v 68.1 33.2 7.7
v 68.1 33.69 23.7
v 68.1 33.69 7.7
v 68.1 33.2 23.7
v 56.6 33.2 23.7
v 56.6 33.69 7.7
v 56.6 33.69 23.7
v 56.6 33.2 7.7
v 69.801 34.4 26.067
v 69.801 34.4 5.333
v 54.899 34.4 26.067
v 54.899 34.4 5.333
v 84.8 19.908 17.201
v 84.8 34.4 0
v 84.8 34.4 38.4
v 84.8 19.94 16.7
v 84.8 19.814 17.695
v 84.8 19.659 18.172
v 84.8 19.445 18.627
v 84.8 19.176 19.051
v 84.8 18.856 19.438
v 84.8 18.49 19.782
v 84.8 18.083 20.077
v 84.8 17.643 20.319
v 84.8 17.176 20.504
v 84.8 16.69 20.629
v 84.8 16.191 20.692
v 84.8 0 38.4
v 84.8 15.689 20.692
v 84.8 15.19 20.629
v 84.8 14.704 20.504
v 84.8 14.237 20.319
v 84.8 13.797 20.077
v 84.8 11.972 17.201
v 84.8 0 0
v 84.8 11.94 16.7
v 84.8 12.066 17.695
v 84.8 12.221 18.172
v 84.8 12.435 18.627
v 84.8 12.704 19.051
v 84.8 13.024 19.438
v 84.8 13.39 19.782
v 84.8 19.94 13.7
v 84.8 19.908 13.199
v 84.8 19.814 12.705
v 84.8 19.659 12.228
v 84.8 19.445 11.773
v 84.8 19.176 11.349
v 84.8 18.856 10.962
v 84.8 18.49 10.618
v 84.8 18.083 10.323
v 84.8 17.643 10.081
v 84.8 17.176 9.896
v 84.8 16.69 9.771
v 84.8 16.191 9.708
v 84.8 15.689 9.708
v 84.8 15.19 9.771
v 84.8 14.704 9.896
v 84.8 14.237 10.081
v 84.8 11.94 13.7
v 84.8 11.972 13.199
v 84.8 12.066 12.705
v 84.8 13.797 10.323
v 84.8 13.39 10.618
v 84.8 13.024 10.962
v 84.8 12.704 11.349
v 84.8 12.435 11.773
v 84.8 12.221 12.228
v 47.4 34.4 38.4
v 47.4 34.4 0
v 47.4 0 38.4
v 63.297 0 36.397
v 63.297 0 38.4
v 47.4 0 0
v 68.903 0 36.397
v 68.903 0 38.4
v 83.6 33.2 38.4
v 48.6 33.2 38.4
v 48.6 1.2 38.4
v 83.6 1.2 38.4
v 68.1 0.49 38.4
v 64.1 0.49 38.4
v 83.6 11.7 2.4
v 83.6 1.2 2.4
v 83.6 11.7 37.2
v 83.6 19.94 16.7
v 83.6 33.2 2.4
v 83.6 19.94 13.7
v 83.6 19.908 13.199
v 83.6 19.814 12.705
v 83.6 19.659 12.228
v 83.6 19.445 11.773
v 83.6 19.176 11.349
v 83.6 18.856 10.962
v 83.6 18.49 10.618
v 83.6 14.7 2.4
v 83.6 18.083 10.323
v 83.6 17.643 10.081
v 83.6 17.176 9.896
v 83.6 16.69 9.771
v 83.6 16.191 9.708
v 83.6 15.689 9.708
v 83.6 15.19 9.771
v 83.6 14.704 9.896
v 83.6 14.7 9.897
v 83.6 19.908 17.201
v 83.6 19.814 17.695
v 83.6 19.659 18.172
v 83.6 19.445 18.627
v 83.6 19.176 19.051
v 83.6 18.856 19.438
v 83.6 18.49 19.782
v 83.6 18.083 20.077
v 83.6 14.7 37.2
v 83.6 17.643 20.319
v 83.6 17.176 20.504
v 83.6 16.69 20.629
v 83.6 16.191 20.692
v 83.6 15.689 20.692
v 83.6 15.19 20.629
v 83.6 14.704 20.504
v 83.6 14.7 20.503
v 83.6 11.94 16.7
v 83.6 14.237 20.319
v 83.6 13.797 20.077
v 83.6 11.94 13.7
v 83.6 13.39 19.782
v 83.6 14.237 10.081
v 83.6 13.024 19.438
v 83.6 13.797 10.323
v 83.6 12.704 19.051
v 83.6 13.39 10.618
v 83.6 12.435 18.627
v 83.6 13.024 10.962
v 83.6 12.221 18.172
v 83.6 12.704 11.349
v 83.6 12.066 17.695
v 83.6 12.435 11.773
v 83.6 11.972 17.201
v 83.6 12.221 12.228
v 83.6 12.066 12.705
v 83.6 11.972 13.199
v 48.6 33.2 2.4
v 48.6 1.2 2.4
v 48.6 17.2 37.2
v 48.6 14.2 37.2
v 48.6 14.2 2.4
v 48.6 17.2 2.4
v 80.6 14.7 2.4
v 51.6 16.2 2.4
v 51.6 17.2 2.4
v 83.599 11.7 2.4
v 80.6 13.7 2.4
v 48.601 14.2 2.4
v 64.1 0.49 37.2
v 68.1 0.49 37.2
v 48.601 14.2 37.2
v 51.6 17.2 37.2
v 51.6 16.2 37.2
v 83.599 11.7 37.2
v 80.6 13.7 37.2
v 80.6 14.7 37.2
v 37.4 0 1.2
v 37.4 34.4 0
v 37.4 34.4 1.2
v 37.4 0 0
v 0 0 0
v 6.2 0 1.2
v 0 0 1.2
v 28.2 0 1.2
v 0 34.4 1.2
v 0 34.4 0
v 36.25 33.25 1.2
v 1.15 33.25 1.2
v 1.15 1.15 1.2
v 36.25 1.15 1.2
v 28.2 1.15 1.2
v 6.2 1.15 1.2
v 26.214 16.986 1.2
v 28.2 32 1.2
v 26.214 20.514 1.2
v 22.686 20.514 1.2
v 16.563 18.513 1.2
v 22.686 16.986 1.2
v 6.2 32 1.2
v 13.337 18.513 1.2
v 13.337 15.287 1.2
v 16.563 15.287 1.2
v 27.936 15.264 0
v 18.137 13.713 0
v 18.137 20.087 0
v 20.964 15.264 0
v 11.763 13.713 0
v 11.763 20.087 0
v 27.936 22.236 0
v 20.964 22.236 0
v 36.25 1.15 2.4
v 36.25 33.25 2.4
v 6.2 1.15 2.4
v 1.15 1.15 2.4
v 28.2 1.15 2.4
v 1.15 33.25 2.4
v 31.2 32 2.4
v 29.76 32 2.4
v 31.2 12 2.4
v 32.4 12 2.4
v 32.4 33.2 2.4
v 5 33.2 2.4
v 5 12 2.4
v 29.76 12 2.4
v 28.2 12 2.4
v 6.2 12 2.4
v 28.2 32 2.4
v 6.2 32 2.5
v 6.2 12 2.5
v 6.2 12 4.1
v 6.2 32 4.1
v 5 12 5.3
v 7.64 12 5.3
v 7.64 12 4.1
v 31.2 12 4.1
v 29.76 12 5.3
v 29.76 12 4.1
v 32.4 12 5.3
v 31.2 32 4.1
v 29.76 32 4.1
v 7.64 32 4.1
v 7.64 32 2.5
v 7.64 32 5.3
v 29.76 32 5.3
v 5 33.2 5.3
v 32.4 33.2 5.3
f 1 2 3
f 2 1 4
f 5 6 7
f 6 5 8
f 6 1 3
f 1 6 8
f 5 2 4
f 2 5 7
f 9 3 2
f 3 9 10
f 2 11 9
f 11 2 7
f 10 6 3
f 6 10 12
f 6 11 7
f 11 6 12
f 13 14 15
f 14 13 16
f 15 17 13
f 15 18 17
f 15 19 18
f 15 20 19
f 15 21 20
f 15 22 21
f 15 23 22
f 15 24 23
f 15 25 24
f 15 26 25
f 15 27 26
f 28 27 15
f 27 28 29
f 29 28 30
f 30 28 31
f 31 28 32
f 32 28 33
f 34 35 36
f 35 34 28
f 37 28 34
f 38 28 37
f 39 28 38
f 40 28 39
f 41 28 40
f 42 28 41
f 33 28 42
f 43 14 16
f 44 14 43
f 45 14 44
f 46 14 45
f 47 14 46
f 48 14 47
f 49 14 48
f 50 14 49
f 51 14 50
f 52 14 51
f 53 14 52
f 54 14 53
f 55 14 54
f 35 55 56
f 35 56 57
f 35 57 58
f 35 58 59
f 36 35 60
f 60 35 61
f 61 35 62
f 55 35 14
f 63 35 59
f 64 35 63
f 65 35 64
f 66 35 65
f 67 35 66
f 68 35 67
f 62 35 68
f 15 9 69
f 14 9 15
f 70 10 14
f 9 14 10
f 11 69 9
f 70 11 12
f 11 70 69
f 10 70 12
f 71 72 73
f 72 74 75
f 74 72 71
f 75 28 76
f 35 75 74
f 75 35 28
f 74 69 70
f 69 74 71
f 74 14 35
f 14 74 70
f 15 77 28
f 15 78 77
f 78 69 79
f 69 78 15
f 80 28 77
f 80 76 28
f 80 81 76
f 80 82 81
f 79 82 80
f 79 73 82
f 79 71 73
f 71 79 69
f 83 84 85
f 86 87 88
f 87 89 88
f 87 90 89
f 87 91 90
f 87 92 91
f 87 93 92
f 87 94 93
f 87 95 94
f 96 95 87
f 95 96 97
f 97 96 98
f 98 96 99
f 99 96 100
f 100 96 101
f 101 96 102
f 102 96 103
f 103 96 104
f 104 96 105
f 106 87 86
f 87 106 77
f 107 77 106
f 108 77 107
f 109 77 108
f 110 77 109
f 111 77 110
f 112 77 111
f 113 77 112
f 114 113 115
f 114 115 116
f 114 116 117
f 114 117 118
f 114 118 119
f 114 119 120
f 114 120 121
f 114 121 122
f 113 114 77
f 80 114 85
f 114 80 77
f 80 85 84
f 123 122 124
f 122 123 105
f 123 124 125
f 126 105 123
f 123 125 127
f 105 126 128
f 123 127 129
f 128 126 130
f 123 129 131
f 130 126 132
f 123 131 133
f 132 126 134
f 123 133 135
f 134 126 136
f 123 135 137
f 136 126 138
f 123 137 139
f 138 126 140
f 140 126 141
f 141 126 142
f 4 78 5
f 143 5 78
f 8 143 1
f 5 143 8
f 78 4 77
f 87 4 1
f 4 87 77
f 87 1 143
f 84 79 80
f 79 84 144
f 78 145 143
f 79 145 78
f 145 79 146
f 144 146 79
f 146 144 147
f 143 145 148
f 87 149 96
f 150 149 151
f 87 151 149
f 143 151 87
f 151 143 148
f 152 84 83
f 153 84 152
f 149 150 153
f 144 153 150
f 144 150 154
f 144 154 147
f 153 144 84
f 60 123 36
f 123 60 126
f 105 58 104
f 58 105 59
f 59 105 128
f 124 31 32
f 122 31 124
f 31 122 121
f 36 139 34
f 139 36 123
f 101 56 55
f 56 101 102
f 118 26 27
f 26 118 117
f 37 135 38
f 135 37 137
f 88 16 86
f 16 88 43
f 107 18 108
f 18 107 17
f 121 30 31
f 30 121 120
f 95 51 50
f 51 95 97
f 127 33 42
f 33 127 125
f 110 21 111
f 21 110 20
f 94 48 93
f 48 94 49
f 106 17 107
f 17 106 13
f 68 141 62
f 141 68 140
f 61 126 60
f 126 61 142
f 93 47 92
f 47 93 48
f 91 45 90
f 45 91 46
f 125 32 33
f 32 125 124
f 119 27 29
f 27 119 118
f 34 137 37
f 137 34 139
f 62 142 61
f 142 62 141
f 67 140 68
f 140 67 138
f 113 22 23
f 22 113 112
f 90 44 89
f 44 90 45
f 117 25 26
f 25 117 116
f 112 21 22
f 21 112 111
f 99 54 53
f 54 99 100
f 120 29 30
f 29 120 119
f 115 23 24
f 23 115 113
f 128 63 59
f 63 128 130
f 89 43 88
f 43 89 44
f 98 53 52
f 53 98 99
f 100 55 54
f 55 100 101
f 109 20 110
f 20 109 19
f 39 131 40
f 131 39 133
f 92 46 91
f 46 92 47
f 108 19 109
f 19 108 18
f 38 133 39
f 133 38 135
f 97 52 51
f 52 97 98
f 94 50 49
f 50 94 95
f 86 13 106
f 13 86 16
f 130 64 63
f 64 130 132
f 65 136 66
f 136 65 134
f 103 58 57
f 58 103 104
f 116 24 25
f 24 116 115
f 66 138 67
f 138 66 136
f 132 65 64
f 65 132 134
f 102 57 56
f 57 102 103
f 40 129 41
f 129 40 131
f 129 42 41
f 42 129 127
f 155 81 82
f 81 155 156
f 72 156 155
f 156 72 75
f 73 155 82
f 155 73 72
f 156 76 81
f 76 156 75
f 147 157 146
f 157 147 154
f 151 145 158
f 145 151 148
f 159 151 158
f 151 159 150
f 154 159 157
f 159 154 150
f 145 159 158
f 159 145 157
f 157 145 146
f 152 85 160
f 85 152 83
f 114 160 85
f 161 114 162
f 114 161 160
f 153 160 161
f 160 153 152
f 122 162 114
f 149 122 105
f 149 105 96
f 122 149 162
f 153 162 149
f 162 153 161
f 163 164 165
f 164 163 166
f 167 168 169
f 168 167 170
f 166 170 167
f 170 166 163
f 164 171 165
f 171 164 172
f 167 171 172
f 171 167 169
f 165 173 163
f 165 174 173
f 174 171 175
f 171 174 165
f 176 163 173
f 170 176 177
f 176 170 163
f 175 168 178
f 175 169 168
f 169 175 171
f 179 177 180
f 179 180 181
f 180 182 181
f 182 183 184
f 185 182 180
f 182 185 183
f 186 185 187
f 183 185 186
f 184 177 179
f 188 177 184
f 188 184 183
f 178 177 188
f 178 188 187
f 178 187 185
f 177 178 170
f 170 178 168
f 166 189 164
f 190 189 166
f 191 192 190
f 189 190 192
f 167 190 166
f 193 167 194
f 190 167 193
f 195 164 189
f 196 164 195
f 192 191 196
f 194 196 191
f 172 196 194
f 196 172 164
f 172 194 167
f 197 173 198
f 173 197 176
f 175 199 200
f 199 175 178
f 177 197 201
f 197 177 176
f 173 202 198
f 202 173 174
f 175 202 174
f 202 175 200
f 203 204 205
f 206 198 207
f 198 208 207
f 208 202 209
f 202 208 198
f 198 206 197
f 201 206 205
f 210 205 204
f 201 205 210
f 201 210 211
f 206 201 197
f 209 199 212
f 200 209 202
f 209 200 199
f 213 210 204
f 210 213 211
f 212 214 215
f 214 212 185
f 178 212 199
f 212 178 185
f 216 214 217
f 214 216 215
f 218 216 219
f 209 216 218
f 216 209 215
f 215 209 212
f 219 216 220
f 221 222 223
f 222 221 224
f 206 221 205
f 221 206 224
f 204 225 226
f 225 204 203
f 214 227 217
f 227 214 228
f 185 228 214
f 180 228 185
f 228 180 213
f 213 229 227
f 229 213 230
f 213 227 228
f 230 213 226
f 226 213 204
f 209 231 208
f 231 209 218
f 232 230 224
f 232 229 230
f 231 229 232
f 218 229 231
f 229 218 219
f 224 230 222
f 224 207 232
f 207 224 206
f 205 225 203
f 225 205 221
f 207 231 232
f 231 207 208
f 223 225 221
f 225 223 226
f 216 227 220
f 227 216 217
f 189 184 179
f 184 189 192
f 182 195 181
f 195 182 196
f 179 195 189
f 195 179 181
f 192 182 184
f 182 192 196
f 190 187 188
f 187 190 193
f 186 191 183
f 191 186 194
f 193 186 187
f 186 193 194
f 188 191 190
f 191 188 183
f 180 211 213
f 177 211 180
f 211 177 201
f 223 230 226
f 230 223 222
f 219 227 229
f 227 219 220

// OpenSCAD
// MODIFY BELOW VARIABLES TO CUSTOMIZE
/*

 WIDTH
  <->
 _____
/     \
▏     ▕       
▏     ▕  ^
▏     ▕  | Height
┕┒    ▕  ⌄ 
 ▕____▕ 

*/

WEMOS_WIDTH = 25;
WEMOS_HEIGHT = 35;
WEMOS_THICKNESS = 1;
WEMOS_WIFI_THICKNESS = 1;
WEMOS_USB_THICKNESS = 2.5;
WEMOS_USB_WIDTH = 8;
WEMOS_USB_CENTER_TO_RIGHT = 14;

USB_CABLE_HEIGHT = 8;
USB_CABLE_WIDTH = 11;

/*
 WIDTH
  <->
 _____
/     \       ^  WEMOS_OLED_OFFSET_TOP
_______       ⌄
▏_____ ▏ ^      
▏▏OLED▏▏ | Height
▏▏___▕▕  ⌄
┕┒_____▏  

*/

WEMOS_OLED_OFFSET_TOP = 7; /* offset to wifi antenna when mounted*/
OLED_WIDTH = 26;
OLED_HEIGHT = 28;
OLED_AND_PINS_THICKNESS = 15;
OLED_THICKNESS = 1.3;
DISPLAY_WIDTH = 16;
DISPLAY_HEIGHT = 11.5;
DISPLAY_OFFSET_LR = 6.5;
DISPLAY_OFFSET_TOP = 1; // offset display to end of it's platine


/*
 WIDTH
  <->
 _______  ^
 ▏○   ◠ ▏ | Height
▕_______▏ ⌄    
SCL -> D1
SDA -> D2

*/
CO2_WIDTH = 25;
CO2_HEIGHT = 20;
CO2_THICKNESS = 1.7;
CO2_OFFSET_LEFT_ENS160 = 7.15;
CO2_OFFSET_BOTTOM_ENS160 = 13.5;
CO2_ENS160_SIZE = 3.2;
CO2_COMP_HEIGHT = 1.2;
CO2_COMP_OFFSET_RIGHT = 3;

CO2_OFFSET_LEFT_AHT21= 16.5;
CO2_OFFSET_BOTTOM_AHT21 = 11.5;
CO2_AHT21_SIZE = 3.5;


/*
           X
          <->
        ________     ^
Y /    /       /|    | Z
 /    /_______/ |    ⌄ 
      |       | /
      |_______|/
*/
BOX_X = WEMOS_HEIGHT;
BOX_Y = 36;
BOX_Z = 32;
WALL_THICKNESS = 1.2;

BOX_X_OUTER = BOX_X + 2 * WALL_THICKNESS;
BOX_Y_OUTER = BOX_Y + 2 * WALL_THICKNESS;
BOX_Z_OUTER = BOX_Z + 2 * WALL_THICKNESS;

// Stützen um Wemos draufzulegen
BOX_BAR_HEIGHT = 3;
BOX_BAR_WIDTH = 3;

// SENS
SENSOR_SUPPORT_BAR_WIDTH = 2.4;

// INTERN PARAMS
WEMOS_UPPER_HEIGHT = OLED_AND_PINS_THICKNESS + WEMOS_THICKNESS;
WEMOS_DISPLAY_OFFSET_TOP = WEMOS_OLED_OFFSET_TOP + DISPLAY_OFFSET_TOP;
CAP_PADDING = BOX_BAR_WIDTH + 2;


/**
 _
| |
|/
Stütze um den WEMOS draufzulegen
*/
module wemos_bar_left() {
    // verbindet die äussere Hülle von Objekten
    translate([0,0,-BOX_BAR_HEIGHT])
        hull() {
            translate([0, 0, BOX_BAR_HEIGHT - 1])
                cube([BOX_BAR_WIDTH, BOX_Y, 1]);
            cube([0.001, BOX_Y, 0.001]); // trick: ein ganz dünner Balken als unteren Rand
        }
}

/**
 _
| |
 \|
Stütze um den WEMOS draufzulegen
*/
module wemos_bar_right() {
    // verbindet die äussere Hülle von Objekten
    translate([0,BOX_Y,0])
        rotate([0,0,180])
            wemos_bar_left();
}


module usb_hole() {
    r = USB_CABLE_HEIGHT / 2;
    translate([-0.01, 0, -(USB_CABLE_HEIGHT - WEMOS_USB_THICKNESS) / 2 - 0.01])
    rotate([0, 90, 0])
        translate([-r, -(USB_CABLE_WIDTH - USB_CABLE_HEIGHT) / 2, 0])
            hull() {
                cylinder(WALL_THICKNESS+0.02, r, r, $fn=50);
                translate([0, USB_CABLE_WIDTH - USB_CABLE_HEIGHT, 0])
                    cylinder(WALL_THICKNESS+0.02, r, r, $fn=50);
            }
}


module display_hole() {
    center_x = DISPLAY_HEIGHT / 2;
    center_y = DISPLAY_WIDTH / 2;
    translate([center_x,center_y, 0.5])
        scale([DISPLAY_HEIGHT, DISPLAY_WIDTH, 1])
            rotate([0,0,45])
                cylinder(h=WALL_THICKNESS,r1=1/sqrt(2), r2=1.5/sqrt(2),$fn=4);
}


module sensor_hole(size) {
    r = size / 2; 
    translate([r, 0, r])
        rotate([-90, 0, 0])
            rotate([0,0,45])
                cylinder(h=WALL_THICKNESS+0.02, r1=sqrt(2)*size, r2=size / sqrt(2), $fn=4);

}

module box() {
    union() {
        difference() {
            // OUTER BOX
            translate([-WALL_THICKNESS, -WALL_THICKNESS, -WALL_THICKNESS])
                cube([BOX_X_OUTER, BOX_Y_OUTER, BOX_Z_OUTER]);

            // INNER BOX
            translate([0, -WALL_THICKNESS-0.1, 0])
                cube([BOX_X,BOX_Y+0.1,BOX_Z]);

            // USB Hole
            usb_y = BOX_Y - WEMOS_USB_CENTER_TO_RIGHT;
            usb_z = BOX_Z - WEMOS_UPPER_HEIGHT - WEMOS_USB_THICKNESS;
            translate([BOX_X, usb_y, usb_z])
                usb_hole();

            // DISPLAY HOLE
            translate([WEMOS_DISPLAY_OFFSET_TOP, BOX_Y - DISPLAY_OFFSET_LR - DISPLAY_WIDTH, BOX_Z - 0.01])
                union() {
                    cube([DISPLAY_HEIGHT, DISPLAY_WIDTH, WALL_THICKNESS + 0.02]);
                    display_hole();
                }
            
            // CAP REMOVAL HOLE
            translate([BOX_X / 2, WALL_THICKNESS / 2 - 2.6, -WALL_THICKNESS*1.1])
                rotate([0, 0, 45])
                    cylinder(h=WALL_THICKNESS+0.02, r1=8 / sqrt(2), r2= 4 / sqrt(2), center=true, $fn=4);
            
        }
        // WIFI-SIDE
        translate([0, 0, BOX_Z - WEMOS_UPPER_HEIGHT])
            wemos_bar_left();

        // USB-SIDE
        translate([BOX_X, 0, BOX_Z - WEMOS_UPPER_HEIGHT - WEMOS_USB_THICKNESS])
            wemos_bar_right();
    }
}
module cap() {
    offset = 0.05;
    difference() {
        union() {
            // BASE
            translate([-WALL_THICKNESS, -WALL_THICKNESS, -WALL_THICKNESS])
                cube([BOX_X_OUTER, WALL_THICKNESS, BOX_Z_OUTER]);
            // INSET
            translate([-offset, 0, -offset])
                cube([BOX_X + 2 * offset, WALL_THICKNESS, BOX_Z + 2 * offset]);
            // HOLDER LEFT
            translate([CAP_PADDING - WALL_THICKNESS, WALL_THICKNESS, WALL_THICKNESS])
                cube([WALL_THICKNESS, CO2_THICKNESS + WALL_THICKNESS, CO2_HEIGHT]);
            
            // HOLDER RIGHT
            translate([CAP_PADDING + CO2_WIDTH, WALL_THICKNESS, WALL_THICKNESS])
                cube([WALL_THICKNESS, CO2_THICKNESS + WALL_THICKNESS, CO2_HEIGHT]);

            // HOLDER BOTTOM
            translate([CAP_PADDING-WALL_THICKNESS, WALL_THICKNESS, 0])
                cube([CO2_WIDTH+2*WALL_THICKNESS, CO2_THICKNESS + WALL_THICKNESS, WALL_THICKNESS]);
            
            // HOLDER TOP
            translate([CAP_PADDING-WALL_THICKNESS, CO2_THICKNESS + WALL_THICKNESS, 0])
                cube([CO2_WIDTH+2*WALL_THICKNESS, WALL_THICKNESS, CO2_HEIGHT + WALL_THICKNESS]);
        }
        // AHT21
        aht_x = CAP_PADDING + CO2_OFFSET_LEFT_AHT21;
        aht_y = -WALL_THICKNESS - 0.01;
        aht_z = WALL_THICKNESS + CO2_OFFSET_BOTTOM_AHT21;
        translate([aht_x,aht_y,aht_z])
            sensor_hole(CO2_AHT21_SIZE );
        
        

        // ENS160        
        ens_x = CAP_PADDING + CO2_OFFSET_LEFT_ENS160;
        ens_y = -WALL_THICKNESS - 0.01;
        ens_z = WALL_THICKNESS + CO2_OFFSET_BOTTOM_ENS160;
        translate([ens_x, ens_y, ens_z])
            sensor_hole(CO2_ENS160_SIZE);

        // SPARE PLACE FOR COMPONENTS
        translate([CAP_PADDING, WALL_THICKNESS - CO2_COMP_HEIGHT, WALL_THICKNESS])
            cube([CO2_WIDTH - CO2_COMP_OFFSET_RIGHT, CO2_COMP_HEIGHT + 0.1, BOX_Z]);

        // REMOVE PART OF CO2 HOLDER TOP
        translate([CAP_PADDING + (SENSOR_SUPPORT_BAR_WIDTH / 2) *WALL_THICKNESS, WALL_THICKNESS, WALL_THICKNESS])
            cube([CO2_WIDTH-SENSOR_SUPPORT_BAR_WIDTH*WALL_THICKNESS, 3*WALL_THICKNESS, CO2_HEIGHT]);
    }
}



// BOX
translate([BOX_X_OUTER + 10, 0, 0]) // translate where you want it
    rotate([270, 0, 0]) // 2: rotate
        translate([WALL_THICKNESS, -BOX_Y_OUTER + WALL_THICKNESS, WALL_THICKNESS]) // 1. bring to origin 
            box();

// CAP
translate([0, BOX_Z_OUTER, 0]) // 3. translate where you want it
    rotate([90, 0, 0]) // 2. rotate
        translate([WALL_THICKNESS,WALL_THICKNESS,WALL_THICKNESS]) // 1. bring to origin
            cap();


//display_hole();
//cap();
//box();
//wemos_bar_right();
//usb_hole();
